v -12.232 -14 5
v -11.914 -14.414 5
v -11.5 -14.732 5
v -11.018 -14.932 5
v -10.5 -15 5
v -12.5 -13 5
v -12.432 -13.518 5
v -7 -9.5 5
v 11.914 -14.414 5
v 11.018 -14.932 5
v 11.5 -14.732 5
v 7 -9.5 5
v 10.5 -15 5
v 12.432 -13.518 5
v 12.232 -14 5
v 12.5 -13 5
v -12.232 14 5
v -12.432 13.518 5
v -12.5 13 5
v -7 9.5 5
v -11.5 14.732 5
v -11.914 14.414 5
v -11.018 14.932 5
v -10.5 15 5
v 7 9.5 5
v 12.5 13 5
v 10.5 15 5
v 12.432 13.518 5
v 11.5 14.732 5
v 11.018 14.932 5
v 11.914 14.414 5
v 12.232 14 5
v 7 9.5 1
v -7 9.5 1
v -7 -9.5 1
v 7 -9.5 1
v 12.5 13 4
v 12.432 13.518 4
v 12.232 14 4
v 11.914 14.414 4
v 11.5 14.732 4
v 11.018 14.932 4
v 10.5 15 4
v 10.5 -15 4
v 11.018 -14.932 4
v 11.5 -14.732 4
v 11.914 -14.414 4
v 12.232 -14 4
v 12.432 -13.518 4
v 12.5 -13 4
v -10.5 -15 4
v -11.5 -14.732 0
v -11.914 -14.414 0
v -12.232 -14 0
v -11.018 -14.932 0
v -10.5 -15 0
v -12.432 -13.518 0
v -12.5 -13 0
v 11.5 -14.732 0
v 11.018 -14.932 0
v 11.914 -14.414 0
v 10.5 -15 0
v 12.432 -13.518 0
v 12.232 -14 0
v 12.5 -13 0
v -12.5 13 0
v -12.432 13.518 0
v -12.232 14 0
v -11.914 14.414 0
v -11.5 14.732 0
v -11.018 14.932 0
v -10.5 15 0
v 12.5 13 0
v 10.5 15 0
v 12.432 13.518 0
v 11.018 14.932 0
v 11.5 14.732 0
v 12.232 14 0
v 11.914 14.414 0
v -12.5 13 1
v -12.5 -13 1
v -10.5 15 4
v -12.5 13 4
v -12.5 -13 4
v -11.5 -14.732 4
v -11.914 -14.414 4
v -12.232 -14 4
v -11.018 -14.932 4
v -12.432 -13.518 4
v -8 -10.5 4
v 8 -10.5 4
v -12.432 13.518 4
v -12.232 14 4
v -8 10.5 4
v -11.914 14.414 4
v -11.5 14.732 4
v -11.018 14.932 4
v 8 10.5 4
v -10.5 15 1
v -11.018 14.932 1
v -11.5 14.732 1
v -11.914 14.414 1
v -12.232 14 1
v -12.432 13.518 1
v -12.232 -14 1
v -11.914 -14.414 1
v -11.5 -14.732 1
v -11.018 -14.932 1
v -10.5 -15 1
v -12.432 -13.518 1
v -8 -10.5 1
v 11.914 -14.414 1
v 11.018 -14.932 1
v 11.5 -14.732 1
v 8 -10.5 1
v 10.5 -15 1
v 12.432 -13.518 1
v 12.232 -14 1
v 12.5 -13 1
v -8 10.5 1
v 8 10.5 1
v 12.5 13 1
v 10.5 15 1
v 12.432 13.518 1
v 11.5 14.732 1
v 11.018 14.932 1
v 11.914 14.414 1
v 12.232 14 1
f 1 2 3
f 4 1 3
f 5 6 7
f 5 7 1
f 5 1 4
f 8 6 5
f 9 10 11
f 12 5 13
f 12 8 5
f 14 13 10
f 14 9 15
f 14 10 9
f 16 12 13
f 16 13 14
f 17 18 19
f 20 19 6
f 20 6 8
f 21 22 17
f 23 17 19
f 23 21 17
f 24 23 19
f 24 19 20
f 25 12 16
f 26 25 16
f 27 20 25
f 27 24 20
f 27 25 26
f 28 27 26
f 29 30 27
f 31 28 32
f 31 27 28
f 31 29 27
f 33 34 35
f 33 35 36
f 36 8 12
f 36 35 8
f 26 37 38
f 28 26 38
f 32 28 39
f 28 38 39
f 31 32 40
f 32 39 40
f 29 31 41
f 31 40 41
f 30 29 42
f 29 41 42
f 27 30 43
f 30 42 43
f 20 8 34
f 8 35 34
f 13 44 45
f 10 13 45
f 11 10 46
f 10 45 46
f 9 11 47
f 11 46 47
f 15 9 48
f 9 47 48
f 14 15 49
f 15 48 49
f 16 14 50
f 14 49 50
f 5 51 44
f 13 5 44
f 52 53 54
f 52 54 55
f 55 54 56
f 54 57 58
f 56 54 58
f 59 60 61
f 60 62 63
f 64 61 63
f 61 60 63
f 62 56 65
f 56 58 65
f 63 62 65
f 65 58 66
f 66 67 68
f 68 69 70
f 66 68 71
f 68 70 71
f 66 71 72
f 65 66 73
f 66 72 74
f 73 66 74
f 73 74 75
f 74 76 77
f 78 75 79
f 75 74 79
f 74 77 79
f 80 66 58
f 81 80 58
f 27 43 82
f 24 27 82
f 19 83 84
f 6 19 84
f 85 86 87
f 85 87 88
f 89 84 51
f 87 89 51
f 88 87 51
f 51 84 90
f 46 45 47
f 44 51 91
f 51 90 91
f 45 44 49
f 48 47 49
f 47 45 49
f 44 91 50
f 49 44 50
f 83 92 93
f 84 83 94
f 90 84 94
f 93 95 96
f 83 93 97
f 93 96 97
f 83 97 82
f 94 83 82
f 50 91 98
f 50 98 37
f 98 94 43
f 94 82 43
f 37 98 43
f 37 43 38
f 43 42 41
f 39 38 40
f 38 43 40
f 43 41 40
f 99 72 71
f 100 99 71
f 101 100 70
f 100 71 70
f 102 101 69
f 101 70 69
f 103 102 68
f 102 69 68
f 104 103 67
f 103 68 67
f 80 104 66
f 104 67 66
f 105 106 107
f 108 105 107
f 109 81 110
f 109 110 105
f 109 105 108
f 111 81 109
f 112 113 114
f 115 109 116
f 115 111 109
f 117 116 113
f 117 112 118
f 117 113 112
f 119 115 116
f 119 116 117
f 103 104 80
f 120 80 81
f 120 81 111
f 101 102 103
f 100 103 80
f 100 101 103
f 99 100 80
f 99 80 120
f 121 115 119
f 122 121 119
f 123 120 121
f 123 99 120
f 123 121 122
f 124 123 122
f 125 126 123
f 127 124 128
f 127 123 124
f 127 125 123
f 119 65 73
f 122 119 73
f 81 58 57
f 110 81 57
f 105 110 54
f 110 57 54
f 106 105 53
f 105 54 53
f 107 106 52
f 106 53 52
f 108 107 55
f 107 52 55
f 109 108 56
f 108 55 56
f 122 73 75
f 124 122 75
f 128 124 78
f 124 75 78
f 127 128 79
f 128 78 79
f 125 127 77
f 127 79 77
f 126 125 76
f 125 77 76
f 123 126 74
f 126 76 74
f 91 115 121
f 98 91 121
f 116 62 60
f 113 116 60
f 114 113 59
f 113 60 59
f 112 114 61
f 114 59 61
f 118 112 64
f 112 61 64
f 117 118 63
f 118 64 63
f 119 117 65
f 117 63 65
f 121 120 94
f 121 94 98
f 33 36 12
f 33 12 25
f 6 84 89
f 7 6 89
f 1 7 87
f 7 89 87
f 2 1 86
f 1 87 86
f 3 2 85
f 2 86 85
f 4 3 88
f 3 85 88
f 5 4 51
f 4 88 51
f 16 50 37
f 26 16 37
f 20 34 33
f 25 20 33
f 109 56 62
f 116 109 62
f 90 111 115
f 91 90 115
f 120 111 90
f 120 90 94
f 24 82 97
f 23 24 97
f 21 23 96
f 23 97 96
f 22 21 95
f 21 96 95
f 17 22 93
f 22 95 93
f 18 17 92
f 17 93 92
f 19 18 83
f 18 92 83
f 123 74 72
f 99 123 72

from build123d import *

# Parameters (mm, degrees)
F1_DEPTH = 1
F2_W     = 16
F2_H     = 21
F2_W_2   = 14
F2_H_2   = 19
F3_DEPTH = 3
F4_W     = 14
F4_H     = 19
F5_DEPTH = 1


with BuildPart() as f1:
    # F0 (on Top) → F1 (new body)
    with BuildSketch(Plane.XY):
        with BuildLine():
            ThreePointArc((12.5, 13), (11.914214, 14.414214), (10.5, 15))
            Line((10.5, 15), (-10.5, 15))
            ThreePointArc((-10.5, 15), (-11.914214, 14.414214), (-12.5, 13))
            Line((-12.5, 13), (-12.5, -13))
            ThreePointArc((-12.5, -13), (-11.914214, -14.414214), (-10.5, -15))
            Line((-10.5, -15), (10.5, -15))
            ThreePointArc((10.5, -15), (11.914214, -14.414214), (12.5, -13))
            Line((12.5, -13), (12.5, 13))
        make_face()
    extrude(amount=F1_DEPTH)

    # F2 (on face) → F3 (join)
    with BuildSketch(Plane.XY.offset(1)):
        Rectangle(F2_W, F2_H)
        Rectangle(F2_W_2, F2_H_2, mode=Mode.SUBTRACT)
    extrude(amount=F3_DEPTH)

    # F4 (on face) → F5 (join)
    with BuildSketch(Plane.XY.offset(4)):
        with BuildLine():
            ThreePointArc((12.5, 13), (11.914214, 14.414214), (10.5, 15))
            Line((10.5, 15), (-10.5, 15))
            ThreePointArc((-10.5, 15), (-11.914214, 14.414214), (-12.5, 13))
            Line((-12.5, 13), (-12.5, -13))
            ThreePointArc((-12.5, -13), (-11.914214, -14.414214), (-10.5, -15))
            Line((-10.5, -15), (10.5, -15))
            ThreePointArc((10.5, -15), (11.914214, -14.414214), (12.5, -13))
            Line((12.5, -13), (12.5, 13))
        make_face()
        Rectangle(F4_W, F4_H, mode=Mode.SUBTRACT)
    extrude(amount=F5_DEPTH)


solid = f1.part
